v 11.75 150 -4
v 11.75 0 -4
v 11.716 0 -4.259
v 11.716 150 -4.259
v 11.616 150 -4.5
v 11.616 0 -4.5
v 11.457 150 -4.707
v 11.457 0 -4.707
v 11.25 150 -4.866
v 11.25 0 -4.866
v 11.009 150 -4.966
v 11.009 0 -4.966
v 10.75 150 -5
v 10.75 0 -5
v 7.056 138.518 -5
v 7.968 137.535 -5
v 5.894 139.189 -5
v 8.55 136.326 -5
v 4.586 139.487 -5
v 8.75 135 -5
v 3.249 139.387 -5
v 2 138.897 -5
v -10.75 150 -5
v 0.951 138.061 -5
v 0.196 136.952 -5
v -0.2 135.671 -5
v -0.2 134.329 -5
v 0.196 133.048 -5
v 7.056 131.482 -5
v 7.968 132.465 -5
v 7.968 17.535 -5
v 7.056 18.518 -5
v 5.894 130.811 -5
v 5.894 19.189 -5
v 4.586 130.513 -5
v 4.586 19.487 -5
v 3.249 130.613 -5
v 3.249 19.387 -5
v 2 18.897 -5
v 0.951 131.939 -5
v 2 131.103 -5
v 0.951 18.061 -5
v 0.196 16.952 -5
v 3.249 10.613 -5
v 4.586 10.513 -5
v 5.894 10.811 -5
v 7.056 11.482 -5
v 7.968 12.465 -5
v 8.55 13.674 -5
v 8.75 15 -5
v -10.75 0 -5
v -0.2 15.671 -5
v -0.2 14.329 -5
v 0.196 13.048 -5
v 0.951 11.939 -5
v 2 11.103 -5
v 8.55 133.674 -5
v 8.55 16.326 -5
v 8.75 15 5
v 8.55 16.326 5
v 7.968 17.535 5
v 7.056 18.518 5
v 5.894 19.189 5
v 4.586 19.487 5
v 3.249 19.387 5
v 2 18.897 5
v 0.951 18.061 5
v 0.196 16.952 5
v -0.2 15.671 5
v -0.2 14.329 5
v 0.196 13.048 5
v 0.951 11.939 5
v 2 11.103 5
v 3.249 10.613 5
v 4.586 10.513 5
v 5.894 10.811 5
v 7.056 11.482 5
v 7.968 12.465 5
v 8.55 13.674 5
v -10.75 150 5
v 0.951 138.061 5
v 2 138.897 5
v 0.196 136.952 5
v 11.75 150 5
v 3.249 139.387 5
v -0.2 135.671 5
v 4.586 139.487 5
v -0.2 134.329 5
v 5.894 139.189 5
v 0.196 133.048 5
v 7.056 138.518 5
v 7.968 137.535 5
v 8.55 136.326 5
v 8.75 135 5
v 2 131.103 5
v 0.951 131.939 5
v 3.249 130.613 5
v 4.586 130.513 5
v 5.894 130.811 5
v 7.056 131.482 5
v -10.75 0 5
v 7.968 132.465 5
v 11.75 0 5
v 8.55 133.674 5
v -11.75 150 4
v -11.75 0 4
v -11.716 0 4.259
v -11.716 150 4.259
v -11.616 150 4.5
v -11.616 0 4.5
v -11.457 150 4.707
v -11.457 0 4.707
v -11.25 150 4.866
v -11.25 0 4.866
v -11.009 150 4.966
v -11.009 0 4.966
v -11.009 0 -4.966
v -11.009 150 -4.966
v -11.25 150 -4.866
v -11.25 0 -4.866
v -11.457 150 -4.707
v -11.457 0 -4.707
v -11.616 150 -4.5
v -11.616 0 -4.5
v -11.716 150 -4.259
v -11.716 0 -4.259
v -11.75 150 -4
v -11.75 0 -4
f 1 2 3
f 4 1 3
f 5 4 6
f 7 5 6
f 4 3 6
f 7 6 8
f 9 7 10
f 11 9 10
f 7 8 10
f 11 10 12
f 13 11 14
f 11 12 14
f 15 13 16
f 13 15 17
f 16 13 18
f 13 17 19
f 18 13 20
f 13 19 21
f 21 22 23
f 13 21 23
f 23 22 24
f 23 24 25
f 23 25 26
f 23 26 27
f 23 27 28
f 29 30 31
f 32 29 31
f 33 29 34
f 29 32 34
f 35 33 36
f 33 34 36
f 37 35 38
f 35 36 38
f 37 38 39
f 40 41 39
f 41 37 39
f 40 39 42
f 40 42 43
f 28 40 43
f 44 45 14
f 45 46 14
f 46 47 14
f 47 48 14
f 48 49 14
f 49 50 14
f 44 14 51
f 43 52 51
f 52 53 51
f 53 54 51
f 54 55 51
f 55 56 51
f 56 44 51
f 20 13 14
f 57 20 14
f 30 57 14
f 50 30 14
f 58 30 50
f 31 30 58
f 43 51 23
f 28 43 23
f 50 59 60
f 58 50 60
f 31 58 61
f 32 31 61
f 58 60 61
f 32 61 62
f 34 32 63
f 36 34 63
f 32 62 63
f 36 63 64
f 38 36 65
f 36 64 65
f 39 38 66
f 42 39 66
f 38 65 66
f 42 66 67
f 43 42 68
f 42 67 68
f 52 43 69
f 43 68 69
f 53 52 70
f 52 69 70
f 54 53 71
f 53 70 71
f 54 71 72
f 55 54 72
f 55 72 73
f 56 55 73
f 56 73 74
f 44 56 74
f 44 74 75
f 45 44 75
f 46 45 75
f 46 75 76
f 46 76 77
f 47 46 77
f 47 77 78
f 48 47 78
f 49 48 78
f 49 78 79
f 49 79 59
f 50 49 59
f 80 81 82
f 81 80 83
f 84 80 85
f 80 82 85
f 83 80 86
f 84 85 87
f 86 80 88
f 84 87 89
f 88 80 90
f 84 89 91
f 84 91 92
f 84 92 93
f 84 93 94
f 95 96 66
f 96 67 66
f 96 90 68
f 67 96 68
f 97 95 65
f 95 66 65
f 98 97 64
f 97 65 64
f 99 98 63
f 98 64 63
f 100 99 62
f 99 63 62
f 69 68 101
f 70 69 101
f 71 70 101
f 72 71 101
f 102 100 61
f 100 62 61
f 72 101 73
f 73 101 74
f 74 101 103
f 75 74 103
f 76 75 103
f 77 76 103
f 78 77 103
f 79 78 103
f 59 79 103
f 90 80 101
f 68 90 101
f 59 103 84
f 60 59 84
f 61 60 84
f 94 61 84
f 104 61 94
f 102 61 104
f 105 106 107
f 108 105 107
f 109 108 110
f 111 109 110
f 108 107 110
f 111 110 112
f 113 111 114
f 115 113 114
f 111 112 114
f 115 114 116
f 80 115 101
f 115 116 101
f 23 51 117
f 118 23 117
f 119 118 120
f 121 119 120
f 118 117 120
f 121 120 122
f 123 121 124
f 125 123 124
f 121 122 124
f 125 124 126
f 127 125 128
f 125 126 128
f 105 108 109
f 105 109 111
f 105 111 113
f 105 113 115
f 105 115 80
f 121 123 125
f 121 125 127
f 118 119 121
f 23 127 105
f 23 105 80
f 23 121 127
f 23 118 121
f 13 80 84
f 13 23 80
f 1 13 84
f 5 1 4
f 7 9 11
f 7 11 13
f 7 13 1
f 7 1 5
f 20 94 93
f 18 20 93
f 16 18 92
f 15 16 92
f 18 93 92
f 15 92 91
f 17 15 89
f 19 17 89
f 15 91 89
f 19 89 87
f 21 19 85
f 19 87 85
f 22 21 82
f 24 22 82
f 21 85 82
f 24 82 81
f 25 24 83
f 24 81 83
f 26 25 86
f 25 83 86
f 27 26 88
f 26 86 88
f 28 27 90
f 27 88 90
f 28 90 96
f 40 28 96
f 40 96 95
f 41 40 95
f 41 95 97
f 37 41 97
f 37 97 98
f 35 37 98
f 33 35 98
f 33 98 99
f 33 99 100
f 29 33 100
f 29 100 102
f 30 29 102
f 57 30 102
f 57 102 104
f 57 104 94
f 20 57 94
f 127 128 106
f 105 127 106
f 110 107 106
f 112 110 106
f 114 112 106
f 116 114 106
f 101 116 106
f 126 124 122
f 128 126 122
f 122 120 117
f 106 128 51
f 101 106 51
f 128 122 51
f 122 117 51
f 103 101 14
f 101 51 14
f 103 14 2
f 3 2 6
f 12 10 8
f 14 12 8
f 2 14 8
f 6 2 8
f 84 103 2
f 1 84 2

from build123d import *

# Parameters (mm, degrees)
BOSS_EXTRUDE1_DEPTH  = 150
M8_CLEARANCE_HOLE1_D = 9


with BuildPart() as part:
    # Sketch1 → Boss-Extrude1 (new body)
    with BuildSketch(Plane(origin=(0, 0, 0), x_dir=(1, 0, 0), z_dir=(0, 1, 0))):
        with BuildLine():
            Line((-10.75, -5), (11.75, -5))
            Line((11.75, -5), (11.75, 4))
            ThreePointArc((11.75, 4), (11.457106781, 4.707106781), (10.75, 5))
            Line((10.75, 5), (-10.75, 5))
            ThreePointArc((-10.75, 5), (-11.457106781, 4.707106781), (-11.75, 4))
            Line((-11.75, 4), (-11.75, -4))
            ThreePointArc((-11.75, -4), (-11.457106781, -4.707106781), (-10.75, -5))
        make_face()
    extrude(amount=BOSS_EXTRUDE1_DEPTH)

    # M8 Clearance Hole1 (through all)
    with Locations(Plane(origin=(0, 0, -5), x_dir=(-1, 0, 0), z_dir=(0, 0, -1))):
        with Locations((-4.25, 135), (-4.25, 15)):
            Hole(M8_CLEARANCE_HOLE1_D / 2)


solid = part.part
